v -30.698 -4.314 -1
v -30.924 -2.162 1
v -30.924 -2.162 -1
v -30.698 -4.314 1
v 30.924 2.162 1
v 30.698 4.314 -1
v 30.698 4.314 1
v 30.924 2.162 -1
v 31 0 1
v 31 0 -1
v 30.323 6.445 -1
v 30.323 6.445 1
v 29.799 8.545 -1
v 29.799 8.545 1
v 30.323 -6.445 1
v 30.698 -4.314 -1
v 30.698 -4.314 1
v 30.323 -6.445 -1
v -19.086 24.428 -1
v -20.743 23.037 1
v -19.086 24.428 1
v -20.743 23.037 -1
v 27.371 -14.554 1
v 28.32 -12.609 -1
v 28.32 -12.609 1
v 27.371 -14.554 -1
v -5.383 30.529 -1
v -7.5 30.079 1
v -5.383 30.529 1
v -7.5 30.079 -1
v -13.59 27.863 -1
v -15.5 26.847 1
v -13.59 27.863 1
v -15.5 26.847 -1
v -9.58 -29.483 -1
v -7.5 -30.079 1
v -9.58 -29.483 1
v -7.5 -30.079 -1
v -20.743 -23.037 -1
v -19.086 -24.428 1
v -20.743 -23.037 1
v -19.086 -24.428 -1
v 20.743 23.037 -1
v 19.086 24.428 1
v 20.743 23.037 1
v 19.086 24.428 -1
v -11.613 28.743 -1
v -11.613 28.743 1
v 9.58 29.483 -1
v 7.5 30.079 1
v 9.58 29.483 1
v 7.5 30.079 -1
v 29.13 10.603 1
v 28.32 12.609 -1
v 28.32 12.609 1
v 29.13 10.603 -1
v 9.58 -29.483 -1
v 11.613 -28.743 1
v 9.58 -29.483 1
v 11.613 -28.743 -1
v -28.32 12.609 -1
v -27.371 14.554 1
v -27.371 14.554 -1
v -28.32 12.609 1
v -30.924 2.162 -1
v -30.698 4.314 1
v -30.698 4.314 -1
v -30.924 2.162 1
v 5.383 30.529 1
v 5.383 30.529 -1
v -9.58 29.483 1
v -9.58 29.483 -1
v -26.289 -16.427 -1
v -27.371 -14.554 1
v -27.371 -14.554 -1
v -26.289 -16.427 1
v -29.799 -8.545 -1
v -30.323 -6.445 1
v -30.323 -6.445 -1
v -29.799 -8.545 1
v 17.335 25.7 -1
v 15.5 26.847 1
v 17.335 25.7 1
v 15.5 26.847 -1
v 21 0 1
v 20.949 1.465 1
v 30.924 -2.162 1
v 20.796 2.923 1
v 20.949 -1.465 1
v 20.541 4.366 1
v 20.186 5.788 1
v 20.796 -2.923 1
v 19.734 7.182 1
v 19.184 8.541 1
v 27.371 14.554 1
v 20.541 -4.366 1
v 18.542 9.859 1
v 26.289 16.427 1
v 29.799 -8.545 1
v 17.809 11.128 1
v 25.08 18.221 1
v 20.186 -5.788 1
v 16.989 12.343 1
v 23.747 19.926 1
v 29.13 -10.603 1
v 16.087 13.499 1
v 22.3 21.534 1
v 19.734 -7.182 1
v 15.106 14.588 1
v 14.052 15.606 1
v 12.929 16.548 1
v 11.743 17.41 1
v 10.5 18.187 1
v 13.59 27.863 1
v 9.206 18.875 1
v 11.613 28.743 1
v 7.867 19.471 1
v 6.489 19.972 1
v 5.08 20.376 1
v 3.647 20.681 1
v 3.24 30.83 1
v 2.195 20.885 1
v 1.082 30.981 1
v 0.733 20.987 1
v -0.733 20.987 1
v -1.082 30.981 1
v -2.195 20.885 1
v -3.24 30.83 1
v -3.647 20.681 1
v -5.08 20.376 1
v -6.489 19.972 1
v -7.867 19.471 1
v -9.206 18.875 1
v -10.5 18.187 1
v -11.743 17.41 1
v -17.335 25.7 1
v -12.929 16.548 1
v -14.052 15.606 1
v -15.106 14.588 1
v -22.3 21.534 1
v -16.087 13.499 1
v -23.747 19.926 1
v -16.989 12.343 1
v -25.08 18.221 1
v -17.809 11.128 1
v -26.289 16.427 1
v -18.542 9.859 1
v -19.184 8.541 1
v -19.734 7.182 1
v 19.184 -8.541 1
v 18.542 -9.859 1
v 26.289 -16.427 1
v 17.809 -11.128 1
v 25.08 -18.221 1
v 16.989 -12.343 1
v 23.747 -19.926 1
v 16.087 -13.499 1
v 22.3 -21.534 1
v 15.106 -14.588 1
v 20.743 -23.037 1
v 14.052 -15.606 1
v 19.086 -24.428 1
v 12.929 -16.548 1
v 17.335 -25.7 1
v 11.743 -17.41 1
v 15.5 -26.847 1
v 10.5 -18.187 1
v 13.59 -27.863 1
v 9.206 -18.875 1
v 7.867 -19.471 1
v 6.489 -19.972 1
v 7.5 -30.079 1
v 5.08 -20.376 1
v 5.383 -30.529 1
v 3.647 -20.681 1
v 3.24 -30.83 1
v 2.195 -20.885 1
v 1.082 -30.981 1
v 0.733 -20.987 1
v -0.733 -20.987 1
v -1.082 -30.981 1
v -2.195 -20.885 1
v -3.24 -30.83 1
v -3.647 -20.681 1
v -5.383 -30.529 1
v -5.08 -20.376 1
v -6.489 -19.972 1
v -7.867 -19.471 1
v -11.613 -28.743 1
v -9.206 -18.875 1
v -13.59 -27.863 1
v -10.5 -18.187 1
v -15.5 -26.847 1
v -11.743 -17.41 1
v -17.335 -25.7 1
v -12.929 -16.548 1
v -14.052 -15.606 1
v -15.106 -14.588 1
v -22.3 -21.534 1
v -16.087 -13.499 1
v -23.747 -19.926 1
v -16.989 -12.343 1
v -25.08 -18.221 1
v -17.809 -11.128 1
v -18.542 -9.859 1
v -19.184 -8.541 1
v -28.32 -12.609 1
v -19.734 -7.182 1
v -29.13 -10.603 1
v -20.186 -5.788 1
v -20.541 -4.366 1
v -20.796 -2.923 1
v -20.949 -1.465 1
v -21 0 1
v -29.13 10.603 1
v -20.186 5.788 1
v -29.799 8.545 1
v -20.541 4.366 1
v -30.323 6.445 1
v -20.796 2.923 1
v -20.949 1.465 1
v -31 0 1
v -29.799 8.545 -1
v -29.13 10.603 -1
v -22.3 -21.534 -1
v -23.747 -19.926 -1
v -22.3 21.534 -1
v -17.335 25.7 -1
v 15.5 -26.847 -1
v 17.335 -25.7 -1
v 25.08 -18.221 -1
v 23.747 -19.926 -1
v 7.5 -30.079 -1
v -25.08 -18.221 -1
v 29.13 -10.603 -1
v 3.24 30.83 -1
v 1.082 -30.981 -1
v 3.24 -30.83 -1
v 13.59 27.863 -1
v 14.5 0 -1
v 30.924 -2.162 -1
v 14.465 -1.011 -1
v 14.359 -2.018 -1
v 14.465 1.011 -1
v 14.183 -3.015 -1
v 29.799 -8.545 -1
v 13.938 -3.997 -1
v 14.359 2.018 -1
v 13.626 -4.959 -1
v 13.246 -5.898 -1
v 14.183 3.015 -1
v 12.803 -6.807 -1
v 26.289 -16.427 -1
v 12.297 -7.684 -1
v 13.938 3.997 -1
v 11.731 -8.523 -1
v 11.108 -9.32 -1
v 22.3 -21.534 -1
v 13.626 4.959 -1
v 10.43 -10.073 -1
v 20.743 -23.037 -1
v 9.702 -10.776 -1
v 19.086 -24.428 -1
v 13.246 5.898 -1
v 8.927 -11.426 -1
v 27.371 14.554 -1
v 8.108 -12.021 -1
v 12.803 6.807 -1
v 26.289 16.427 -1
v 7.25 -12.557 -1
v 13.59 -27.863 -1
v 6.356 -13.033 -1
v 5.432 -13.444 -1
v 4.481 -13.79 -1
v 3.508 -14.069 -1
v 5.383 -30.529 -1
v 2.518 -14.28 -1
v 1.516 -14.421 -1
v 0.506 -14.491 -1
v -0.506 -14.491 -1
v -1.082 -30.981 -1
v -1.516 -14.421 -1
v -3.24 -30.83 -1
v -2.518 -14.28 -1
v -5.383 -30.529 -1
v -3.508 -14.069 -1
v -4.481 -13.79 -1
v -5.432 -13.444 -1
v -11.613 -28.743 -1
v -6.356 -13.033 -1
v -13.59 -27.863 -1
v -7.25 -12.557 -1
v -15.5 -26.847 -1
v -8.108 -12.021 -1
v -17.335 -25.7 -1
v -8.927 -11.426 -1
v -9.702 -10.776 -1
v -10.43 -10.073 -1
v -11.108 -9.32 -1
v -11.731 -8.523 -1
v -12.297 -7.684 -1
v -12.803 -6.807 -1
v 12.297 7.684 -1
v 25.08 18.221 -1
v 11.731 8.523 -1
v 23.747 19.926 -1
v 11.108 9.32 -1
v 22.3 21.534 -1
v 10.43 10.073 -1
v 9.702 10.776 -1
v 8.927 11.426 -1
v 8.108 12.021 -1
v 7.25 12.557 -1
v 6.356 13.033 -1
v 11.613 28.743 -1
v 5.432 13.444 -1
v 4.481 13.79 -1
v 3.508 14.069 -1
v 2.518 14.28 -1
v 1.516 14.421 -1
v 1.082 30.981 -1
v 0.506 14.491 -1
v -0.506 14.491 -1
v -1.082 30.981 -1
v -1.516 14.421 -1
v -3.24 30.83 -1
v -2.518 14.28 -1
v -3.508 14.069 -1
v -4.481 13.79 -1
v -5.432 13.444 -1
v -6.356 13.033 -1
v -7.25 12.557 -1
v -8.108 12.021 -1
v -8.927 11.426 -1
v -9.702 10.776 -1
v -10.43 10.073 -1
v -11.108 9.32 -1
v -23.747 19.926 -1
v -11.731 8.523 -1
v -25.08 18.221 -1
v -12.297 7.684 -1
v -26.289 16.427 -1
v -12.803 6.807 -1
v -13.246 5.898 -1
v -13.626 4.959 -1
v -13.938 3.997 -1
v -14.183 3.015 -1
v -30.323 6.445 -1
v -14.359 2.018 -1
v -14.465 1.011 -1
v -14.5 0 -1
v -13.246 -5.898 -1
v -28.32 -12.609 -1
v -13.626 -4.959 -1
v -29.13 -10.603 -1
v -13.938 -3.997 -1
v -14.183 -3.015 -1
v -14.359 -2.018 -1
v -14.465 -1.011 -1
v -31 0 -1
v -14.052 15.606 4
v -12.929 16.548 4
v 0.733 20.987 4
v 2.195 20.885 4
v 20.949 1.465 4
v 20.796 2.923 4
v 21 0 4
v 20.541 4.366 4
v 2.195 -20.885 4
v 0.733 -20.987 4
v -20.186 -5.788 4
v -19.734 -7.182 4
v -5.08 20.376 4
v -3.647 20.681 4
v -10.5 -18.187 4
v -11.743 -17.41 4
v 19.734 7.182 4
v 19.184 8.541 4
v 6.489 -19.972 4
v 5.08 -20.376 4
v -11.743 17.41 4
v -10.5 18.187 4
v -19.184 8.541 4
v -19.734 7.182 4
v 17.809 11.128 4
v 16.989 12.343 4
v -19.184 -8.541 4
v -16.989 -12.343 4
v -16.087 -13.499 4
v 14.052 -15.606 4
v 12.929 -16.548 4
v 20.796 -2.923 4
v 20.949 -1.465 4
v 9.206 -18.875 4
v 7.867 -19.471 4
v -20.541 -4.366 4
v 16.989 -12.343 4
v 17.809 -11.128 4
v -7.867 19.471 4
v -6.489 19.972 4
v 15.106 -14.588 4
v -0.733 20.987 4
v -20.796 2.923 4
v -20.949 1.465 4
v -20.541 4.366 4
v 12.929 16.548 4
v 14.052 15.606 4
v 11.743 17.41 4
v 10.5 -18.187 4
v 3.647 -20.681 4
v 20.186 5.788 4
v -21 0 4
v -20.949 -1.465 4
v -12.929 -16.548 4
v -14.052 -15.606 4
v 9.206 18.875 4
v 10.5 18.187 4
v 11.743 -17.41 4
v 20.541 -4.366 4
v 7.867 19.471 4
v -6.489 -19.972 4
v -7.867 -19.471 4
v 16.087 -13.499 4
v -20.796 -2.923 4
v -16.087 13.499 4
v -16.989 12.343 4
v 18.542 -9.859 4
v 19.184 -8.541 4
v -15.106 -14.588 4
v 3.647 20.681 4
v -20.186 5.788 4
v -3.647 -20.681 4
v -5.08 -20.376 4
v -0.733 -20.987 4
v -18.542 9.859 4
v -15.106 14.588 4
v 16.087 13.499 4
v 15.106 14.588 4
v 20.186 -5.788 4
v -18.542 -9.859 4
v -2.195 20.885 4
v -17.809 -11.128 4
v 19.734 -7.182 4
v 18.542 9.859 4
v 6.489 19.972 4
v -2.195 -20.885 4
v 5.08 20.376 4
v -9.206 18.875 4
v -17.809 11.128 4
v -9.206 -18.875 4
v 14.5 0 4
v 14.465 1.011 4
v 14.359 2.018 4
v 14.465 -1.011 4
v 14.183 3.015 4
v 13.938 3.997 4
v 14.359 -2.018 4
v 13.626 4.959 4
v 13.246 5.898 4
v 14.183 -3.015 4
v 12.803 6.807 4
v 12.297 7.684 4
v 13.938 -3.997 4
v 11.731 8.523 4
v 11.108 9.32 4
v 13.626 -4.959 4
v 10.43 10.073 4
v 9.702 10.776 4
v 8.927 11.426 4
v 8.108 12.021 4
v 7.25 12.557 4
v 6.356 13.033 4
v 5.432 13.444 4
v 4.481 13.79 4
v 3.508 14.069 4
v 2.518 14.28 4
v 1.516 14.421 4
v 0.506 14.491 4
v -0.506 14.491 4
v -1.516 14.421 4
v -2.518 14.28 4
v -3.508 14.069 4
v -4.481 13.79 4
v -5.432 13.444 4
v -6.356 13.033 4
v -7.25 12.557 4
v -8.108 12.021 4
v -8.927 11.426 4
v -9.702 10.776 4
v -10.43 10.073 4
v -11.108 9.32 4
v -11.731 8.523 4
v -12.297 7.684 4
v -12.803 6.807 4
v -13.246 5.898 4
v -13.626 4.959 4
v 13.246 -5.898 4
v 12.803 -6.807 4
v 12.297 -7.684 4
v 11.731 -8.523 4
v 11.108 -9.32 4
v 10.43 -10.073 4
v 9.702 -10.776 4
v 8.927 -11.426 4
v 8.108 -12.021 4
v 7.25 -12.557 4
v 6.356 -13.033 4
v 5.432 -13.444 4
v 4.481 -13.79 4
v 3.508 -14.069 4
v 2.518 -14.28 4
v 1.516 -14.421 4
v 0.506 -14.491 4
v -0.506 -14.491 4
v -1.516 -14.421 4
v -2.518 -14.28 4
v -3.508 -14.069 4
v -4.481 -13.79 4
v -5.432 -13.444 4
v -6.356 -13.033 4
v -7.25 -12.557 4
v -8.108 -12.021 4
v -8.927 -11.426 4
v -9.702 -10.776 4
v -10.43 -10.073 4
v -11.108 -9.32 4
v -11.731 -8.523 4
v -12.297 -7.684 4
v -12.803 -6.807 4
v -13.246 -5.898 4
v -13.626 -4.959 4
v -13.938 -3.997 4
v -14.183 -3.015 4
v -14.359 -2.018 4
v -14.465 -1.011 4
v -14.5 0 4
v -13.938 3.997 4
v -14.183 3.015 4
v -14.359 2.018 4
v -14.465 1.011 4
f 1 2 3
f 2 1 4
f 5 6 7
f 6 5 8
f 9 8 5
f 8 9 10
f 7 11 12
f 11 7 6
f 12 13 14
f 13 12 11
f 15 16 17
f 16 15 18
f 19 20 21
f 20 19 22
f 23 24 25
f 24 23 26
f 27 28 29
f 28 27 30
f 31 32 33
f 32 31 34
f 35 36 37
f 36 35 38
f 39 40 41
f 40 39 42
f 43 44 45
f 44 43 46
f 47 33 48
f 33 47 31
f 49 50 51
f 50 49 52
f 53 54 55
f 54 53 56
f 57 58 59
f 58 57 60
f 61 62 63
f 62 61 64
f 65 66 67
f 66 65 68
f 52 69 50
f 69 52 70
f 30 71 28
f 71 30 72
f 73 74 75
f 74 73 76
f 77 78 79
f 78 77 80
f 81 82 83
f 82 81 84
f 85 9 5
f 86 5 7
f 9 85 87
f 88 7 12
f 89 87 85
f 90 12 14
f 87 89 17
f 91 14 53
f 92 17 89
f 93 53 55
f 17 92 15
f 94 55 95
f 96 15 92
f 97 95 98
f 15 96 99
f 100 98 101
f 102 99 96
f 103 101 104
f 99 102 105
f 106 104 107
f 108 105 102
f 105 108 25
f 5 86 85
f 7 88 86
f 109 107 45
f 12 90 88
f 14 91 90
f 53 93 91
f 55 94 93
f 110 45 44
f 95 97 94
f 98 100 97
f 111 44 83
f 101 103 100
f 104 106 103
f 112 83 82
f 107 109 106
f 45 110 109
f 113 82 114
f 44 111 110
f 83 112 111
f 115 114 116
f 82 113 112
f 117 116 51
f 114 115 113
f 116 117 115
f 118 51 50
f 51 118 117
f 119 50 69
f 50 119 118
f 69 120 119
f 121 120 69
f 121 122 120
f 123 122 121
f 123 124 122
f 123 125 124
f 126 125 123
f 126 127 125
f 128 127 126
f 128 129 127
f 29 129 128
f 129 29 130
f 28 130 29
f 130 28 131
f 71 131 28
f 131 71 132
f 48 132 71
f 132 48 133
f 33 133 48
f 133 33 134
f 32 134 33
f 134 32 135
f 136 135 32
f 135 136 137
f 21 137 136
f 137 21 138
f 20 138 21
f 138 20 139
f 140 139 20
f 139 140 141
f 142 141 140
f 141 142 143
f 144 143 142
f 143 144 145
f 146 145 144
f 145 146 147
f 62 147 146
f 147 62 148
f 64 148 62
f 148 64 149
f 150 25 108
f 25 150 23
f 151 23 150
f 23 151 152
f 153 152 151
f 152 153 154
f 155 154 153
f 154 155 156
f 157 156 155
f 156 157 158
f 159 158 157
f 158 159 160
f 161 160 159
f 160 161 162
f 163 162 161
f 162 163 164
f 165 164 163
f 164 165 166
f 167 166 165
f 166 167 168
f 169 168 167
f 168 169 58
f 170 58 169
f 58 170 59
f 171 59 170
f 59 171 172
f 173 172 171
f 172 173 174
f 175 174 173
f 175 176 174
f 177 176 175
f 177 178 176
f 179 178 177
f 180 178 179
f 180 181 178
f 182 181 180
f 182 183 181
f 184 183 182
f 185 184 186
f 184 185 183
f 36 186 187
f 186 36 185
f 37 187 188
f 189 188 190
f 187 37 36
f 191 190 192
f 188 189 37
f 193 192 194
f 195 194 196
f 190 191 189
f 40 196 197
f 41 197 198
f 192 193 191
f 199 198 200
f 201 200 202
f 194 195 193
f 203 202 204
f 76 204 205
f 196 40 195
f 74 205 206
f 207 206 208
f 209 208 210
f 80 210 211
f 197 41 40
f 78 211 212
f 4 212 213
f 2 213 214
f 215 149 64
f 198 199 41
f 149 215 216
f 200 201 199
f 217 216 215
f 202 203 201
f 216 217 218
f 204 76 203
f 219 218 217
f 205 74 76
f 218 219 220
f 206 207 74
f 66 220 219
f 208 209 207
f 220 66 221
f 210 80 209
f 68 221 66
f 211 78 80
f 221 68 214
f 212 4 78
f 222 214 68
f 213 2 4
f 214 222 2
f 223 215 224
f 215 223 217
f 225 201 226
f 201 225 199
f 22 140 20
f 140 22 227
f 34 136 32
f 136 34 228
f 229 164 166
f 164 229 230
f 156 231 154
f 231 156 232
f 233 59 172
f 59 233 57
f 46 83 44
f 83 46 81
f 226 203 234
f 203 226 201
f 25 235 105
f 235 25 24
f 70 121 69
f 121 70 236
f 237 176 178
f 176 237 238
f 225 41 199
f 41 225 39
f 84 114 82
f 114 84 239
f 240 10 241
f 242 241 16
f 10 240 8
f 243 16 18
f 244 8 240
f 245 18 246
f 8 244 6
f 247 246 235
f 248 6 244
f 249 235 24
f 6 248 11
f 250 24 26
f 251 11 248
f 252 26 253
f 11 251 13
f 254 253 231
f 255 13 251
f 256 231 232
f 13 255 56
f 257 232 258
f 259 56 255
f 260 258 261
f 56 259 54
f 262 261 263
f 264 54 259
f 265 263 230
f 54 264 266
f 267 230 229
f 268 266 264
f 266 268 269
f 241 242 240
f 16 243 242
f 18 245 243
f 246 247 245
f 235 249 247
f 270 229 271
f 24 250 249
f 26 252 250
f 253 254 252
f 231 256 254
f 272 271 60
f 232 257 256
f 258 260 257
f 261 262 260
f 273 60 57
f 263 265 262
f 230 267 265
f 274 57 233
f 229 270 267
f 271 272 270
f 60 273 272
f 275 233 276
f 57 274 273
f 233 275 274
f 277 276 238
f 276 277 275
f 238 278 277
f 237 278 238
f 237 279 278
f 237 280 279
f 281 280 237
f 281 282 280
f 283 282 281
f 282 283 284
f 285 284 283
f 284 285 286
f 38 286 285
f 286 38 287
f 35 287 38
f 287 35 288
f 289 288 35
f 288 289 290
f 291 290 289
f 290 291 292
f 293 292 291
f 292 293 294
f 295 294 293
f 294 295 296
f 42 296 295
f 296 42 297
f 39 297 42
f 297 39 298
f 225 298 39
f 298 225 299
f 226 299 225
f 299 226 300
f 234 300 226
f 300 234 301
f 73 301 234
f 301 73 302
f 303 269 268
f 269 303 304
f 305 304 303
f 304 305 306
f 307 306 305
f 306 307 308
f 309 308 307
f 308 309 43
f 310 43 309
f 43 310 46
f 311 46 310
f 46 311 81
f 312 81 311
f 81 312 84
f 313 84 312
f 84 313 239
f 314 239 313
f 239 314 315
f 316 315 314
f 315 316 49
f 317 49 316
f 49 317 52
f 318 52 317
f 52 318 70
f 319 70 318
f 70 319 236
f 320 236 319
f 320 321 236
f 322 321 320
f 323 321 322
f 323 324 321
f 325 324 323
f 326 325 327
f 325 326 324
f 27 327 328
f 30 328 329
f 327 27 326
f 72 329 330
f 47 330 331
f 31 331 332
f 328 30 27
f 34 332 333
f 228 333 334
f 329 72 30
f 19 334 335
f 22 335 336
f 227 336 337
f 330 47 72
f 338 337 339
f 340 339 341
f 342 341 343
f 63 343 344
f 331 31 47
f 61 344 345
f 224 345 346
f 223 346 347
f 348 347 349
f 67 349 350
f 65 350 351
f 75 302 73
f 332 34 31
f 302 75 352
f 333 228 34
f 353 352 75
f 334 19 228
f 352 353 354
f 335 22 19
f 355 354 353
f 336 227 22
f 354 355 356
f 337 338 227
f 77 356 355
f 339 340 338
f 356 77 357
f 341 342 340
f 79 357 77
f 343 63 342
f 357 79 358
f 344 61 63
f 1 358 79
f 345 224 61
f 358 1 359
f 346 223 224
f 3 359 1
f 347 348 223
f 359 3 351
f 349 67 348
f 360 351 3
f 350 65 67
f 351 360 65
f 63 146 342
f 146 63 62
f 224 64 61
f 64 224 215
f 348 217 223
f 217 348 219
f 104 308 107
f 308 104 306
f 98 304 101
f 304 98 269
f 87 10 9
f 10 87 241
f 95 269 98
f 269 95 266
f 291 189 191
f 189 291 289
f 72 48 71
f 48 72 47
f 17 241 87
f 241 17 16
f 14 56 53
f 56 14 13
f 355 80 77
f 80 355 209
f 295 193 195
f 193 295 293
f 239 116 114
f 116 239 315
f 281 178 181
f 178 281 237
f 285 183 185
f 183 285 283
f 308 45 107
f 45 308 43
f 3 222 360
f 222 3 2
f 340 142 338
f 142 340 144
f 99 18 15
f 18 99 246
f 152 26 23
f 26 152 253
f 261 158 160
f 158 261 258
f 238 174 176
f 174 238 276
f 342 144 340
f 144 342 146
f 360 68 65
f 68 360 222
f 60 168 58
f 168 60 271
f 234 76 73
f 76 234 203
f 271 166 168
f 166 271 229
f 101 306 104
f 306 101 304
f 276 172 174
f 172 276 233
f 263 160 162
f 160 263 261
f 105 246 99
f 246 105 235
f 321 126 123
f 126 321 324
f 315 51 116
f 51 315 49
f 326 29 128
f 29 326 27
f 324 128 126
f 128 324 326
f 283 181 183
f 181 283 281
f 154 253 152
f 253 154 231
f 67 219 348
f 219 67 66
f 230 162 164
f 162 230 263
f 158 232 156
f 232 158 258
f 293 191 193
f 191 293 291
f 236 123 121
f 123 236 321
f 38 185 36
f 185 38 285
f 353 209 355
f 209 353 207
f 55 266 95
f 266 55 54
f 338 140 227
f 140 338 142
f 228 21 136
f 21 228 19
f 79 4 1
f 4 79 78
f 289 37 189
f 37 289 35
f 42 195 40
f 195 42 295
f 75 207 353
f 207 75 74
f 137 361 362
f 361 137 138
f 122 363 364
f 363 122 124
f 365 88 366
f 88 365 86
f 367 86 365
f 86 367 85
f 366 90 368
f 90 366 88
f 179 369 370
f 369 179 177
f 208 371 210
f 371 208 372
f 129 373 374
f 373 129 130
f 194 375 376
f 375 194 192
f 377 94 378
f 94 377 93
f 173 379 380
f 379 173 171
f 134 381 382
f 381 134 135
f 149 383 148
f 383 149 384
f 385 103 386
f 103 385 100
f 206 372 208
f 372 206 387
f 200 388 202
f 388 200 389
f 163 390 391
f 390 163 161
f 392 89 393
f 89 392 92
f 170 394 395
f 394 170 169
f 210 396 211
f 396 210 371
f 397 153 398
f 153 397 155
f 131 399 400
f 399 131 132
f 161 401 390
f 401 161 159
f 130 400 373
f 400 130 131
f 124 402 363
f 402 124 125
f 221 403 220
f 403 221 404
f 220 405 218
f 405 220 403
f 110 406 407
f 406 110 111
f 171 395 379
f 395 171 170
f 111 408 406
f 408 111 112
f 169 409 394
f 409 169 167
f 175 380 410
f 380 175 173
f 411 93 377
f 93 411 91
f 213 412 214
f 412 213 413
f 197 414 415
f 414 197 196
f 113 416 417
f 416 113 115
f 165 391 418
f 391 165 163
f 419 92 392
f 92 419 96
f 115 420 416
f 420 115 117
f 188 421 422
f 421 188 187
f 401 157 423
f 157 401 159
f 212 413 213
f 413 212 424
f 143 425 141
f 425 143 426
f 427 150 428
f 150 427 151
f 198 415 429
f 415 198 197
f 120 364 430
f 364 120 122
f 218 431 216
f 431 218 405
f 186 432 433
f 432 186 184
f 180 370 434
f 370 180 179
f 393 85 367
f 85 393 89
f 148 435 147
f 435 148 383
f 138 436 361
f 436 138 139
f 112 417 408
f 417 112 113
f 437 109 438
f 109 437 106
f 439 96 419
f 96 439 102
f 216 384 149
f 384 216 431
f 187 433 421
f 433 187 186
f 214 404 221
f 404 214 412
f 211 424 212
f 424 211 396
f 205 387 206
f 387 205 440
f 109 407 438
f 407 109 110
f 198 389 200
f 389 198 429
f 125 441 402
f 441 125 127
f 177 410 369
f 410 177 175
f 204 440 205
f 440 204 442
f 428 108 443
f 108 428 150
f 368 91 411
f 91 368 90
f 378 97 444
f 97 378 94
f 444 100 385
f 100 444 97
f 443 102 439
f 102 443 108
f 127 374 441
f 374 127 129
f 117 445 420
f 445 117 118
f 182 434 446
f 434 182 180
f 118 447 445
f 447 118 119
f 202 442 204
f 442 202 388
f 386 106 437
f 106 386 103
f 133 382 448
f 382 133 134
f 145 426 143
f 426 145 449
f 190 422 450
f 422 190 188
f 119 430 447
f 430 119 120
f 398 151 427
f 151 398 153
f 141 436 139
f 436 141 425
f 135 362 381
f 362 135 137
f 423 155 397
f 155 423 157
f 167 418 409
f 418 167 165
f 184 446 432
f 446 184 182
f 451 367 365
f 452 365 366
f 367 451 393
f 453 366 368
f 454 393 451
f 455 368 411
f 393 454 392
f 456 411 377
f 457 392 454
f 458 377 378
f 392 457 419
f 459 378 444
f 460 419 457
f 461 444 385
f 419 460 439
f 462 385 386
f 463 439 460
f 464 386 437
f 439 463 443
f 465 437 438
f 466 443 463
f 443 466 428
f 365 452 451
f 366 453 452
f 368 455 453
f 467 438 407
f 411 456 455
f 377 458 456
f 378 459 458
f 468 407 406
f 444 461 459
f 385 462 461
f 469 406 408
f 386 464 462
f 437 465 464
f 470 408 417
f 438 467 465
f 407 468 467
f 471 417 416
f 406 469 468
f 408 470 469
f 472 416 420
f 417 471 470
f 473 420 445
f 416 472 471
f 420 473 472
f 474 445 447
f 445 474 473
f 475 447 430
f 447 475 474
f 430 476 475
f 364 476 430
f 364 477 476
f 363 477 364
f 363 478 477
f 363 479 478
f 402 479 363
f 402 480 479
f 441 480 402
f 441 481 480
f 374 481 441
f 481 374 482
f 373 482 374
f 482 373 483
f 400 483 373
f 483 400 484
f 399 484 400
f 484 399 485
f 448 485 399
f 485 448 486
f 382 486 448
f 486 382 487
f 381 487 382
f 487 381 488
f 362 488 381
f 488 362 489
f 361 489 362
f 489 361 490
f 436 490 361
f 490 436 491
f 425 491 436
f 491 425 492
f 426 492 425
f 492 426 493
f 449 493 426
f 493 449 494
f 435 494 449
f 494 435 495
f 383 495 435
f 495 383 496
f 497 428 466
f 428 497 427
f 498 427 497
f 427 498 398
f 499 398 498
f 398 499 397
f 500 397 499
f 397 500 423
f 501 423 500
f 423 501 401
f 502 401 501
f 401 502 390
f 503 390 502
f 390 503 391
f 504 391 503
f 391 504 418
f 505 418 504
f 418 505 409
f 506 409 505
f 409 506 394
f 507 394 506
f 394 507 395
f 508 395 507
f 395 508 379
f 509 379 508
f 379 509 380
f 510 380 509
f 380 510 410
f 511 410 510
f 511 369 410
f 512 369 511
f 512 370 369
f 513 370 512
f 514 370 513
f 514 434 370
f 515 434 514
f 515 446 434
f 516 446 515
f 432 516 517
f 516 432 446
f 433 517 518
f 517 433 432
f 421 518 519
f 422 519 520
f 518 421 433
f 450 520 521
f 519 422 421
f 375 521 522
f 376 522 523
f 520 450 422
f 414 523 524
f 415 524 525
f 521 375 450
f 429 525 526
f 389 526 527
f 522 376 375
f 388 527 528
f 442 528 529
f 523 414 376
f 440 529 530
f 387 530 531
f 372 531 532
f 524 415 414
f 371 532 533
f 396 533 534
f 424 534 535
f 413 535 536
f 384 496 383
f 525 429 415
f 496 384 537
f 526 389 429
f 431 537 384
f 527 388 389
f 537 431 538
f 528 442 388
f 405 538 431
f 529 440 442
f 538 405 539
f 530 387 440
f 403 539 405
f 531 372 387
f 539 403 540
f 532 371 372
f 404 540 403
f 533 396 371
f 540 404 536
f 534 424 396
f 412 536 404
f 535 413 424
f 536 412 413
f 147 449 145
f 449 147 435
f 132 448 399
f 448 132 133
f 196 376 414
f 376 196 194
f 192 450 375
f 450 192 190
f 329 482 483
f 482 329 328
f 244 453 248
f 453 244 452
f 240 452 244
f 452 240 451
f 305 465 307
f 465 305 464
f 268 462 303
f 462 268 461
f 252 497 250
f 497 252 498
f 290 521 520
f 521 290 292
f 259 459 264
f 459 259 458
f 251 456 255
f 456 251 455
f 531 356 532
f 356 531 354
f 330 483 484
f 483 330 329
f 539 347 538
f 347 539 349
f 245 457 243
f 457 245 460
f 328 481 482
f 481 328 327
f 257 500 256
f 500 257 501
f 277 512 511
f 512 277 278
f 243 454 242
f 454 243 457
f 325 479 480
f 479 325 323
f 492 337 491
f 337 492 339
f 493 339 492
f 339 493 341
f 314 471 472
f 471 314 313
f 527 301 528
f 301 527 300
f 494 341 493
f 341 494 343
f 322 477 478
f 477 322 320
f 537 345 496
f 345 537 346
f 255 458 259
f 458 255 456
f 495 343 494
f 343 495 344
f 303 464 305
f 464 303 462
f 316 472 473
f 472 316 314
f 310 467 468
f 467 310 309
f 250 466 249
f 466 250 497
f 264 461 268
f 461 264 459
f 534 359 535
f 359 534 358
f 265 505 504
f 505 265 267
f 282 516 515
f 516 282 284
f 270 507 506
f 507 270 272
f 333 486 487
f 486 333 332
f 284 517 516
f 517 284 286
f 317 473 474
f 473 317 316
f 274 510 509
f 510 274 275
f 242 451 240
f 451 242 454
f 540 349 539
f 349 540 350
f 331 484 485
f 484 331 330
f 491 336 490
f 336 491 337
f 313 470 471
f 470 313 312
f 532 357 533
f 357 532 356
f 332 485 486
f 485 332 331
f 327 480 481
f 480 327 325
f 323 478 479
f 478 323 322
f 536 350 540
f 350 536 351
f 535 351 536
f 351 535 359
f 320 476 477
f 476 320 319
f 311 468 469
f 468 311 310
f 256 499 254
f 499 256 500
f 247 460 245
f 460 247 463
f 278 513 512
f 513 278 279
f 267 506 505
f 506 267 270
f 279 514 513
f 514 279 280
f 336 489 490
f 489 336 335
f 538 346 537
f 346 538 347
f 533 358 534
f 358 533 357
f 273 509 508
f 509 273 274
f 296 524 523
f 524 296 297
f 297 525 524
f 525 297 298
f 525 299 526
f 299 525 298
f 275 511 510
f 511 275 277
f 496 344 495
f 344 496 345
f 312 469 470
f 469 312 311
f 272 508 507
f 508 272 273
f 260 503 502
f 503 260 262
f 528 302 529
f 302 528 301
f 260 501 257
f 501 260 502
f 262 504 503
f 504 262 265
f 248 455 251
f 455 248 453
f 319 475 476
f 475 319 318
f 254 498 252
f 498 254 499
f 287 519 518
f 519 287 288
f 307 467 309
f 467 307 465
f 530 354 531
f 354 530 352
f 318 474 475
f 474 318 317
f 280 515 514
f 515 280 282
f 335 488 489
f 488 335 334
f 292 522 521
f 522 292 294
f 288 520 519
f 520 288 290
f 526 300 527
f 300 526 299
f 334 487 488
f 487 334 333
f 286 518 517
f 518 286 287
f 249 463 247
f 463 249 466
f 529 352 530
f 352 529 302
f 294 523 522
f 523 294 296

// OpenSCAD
$fn = 90;
innerDiameter = 29;
middleDiameter = 42;
middleHeight = 4;
outerDiameter = 62;
outerHeight = 2;


difference() {
union() {
    cylinder(d=outerDiameter, h=outerHeight, center=true);
    translate([0, 0, middleHeight / 2]) cylinder(d=middleDiameter, h=middleHeight, center=true);
}
cylinder(d=innerDiameter, h=middleHeight + 10, center=true);
}
